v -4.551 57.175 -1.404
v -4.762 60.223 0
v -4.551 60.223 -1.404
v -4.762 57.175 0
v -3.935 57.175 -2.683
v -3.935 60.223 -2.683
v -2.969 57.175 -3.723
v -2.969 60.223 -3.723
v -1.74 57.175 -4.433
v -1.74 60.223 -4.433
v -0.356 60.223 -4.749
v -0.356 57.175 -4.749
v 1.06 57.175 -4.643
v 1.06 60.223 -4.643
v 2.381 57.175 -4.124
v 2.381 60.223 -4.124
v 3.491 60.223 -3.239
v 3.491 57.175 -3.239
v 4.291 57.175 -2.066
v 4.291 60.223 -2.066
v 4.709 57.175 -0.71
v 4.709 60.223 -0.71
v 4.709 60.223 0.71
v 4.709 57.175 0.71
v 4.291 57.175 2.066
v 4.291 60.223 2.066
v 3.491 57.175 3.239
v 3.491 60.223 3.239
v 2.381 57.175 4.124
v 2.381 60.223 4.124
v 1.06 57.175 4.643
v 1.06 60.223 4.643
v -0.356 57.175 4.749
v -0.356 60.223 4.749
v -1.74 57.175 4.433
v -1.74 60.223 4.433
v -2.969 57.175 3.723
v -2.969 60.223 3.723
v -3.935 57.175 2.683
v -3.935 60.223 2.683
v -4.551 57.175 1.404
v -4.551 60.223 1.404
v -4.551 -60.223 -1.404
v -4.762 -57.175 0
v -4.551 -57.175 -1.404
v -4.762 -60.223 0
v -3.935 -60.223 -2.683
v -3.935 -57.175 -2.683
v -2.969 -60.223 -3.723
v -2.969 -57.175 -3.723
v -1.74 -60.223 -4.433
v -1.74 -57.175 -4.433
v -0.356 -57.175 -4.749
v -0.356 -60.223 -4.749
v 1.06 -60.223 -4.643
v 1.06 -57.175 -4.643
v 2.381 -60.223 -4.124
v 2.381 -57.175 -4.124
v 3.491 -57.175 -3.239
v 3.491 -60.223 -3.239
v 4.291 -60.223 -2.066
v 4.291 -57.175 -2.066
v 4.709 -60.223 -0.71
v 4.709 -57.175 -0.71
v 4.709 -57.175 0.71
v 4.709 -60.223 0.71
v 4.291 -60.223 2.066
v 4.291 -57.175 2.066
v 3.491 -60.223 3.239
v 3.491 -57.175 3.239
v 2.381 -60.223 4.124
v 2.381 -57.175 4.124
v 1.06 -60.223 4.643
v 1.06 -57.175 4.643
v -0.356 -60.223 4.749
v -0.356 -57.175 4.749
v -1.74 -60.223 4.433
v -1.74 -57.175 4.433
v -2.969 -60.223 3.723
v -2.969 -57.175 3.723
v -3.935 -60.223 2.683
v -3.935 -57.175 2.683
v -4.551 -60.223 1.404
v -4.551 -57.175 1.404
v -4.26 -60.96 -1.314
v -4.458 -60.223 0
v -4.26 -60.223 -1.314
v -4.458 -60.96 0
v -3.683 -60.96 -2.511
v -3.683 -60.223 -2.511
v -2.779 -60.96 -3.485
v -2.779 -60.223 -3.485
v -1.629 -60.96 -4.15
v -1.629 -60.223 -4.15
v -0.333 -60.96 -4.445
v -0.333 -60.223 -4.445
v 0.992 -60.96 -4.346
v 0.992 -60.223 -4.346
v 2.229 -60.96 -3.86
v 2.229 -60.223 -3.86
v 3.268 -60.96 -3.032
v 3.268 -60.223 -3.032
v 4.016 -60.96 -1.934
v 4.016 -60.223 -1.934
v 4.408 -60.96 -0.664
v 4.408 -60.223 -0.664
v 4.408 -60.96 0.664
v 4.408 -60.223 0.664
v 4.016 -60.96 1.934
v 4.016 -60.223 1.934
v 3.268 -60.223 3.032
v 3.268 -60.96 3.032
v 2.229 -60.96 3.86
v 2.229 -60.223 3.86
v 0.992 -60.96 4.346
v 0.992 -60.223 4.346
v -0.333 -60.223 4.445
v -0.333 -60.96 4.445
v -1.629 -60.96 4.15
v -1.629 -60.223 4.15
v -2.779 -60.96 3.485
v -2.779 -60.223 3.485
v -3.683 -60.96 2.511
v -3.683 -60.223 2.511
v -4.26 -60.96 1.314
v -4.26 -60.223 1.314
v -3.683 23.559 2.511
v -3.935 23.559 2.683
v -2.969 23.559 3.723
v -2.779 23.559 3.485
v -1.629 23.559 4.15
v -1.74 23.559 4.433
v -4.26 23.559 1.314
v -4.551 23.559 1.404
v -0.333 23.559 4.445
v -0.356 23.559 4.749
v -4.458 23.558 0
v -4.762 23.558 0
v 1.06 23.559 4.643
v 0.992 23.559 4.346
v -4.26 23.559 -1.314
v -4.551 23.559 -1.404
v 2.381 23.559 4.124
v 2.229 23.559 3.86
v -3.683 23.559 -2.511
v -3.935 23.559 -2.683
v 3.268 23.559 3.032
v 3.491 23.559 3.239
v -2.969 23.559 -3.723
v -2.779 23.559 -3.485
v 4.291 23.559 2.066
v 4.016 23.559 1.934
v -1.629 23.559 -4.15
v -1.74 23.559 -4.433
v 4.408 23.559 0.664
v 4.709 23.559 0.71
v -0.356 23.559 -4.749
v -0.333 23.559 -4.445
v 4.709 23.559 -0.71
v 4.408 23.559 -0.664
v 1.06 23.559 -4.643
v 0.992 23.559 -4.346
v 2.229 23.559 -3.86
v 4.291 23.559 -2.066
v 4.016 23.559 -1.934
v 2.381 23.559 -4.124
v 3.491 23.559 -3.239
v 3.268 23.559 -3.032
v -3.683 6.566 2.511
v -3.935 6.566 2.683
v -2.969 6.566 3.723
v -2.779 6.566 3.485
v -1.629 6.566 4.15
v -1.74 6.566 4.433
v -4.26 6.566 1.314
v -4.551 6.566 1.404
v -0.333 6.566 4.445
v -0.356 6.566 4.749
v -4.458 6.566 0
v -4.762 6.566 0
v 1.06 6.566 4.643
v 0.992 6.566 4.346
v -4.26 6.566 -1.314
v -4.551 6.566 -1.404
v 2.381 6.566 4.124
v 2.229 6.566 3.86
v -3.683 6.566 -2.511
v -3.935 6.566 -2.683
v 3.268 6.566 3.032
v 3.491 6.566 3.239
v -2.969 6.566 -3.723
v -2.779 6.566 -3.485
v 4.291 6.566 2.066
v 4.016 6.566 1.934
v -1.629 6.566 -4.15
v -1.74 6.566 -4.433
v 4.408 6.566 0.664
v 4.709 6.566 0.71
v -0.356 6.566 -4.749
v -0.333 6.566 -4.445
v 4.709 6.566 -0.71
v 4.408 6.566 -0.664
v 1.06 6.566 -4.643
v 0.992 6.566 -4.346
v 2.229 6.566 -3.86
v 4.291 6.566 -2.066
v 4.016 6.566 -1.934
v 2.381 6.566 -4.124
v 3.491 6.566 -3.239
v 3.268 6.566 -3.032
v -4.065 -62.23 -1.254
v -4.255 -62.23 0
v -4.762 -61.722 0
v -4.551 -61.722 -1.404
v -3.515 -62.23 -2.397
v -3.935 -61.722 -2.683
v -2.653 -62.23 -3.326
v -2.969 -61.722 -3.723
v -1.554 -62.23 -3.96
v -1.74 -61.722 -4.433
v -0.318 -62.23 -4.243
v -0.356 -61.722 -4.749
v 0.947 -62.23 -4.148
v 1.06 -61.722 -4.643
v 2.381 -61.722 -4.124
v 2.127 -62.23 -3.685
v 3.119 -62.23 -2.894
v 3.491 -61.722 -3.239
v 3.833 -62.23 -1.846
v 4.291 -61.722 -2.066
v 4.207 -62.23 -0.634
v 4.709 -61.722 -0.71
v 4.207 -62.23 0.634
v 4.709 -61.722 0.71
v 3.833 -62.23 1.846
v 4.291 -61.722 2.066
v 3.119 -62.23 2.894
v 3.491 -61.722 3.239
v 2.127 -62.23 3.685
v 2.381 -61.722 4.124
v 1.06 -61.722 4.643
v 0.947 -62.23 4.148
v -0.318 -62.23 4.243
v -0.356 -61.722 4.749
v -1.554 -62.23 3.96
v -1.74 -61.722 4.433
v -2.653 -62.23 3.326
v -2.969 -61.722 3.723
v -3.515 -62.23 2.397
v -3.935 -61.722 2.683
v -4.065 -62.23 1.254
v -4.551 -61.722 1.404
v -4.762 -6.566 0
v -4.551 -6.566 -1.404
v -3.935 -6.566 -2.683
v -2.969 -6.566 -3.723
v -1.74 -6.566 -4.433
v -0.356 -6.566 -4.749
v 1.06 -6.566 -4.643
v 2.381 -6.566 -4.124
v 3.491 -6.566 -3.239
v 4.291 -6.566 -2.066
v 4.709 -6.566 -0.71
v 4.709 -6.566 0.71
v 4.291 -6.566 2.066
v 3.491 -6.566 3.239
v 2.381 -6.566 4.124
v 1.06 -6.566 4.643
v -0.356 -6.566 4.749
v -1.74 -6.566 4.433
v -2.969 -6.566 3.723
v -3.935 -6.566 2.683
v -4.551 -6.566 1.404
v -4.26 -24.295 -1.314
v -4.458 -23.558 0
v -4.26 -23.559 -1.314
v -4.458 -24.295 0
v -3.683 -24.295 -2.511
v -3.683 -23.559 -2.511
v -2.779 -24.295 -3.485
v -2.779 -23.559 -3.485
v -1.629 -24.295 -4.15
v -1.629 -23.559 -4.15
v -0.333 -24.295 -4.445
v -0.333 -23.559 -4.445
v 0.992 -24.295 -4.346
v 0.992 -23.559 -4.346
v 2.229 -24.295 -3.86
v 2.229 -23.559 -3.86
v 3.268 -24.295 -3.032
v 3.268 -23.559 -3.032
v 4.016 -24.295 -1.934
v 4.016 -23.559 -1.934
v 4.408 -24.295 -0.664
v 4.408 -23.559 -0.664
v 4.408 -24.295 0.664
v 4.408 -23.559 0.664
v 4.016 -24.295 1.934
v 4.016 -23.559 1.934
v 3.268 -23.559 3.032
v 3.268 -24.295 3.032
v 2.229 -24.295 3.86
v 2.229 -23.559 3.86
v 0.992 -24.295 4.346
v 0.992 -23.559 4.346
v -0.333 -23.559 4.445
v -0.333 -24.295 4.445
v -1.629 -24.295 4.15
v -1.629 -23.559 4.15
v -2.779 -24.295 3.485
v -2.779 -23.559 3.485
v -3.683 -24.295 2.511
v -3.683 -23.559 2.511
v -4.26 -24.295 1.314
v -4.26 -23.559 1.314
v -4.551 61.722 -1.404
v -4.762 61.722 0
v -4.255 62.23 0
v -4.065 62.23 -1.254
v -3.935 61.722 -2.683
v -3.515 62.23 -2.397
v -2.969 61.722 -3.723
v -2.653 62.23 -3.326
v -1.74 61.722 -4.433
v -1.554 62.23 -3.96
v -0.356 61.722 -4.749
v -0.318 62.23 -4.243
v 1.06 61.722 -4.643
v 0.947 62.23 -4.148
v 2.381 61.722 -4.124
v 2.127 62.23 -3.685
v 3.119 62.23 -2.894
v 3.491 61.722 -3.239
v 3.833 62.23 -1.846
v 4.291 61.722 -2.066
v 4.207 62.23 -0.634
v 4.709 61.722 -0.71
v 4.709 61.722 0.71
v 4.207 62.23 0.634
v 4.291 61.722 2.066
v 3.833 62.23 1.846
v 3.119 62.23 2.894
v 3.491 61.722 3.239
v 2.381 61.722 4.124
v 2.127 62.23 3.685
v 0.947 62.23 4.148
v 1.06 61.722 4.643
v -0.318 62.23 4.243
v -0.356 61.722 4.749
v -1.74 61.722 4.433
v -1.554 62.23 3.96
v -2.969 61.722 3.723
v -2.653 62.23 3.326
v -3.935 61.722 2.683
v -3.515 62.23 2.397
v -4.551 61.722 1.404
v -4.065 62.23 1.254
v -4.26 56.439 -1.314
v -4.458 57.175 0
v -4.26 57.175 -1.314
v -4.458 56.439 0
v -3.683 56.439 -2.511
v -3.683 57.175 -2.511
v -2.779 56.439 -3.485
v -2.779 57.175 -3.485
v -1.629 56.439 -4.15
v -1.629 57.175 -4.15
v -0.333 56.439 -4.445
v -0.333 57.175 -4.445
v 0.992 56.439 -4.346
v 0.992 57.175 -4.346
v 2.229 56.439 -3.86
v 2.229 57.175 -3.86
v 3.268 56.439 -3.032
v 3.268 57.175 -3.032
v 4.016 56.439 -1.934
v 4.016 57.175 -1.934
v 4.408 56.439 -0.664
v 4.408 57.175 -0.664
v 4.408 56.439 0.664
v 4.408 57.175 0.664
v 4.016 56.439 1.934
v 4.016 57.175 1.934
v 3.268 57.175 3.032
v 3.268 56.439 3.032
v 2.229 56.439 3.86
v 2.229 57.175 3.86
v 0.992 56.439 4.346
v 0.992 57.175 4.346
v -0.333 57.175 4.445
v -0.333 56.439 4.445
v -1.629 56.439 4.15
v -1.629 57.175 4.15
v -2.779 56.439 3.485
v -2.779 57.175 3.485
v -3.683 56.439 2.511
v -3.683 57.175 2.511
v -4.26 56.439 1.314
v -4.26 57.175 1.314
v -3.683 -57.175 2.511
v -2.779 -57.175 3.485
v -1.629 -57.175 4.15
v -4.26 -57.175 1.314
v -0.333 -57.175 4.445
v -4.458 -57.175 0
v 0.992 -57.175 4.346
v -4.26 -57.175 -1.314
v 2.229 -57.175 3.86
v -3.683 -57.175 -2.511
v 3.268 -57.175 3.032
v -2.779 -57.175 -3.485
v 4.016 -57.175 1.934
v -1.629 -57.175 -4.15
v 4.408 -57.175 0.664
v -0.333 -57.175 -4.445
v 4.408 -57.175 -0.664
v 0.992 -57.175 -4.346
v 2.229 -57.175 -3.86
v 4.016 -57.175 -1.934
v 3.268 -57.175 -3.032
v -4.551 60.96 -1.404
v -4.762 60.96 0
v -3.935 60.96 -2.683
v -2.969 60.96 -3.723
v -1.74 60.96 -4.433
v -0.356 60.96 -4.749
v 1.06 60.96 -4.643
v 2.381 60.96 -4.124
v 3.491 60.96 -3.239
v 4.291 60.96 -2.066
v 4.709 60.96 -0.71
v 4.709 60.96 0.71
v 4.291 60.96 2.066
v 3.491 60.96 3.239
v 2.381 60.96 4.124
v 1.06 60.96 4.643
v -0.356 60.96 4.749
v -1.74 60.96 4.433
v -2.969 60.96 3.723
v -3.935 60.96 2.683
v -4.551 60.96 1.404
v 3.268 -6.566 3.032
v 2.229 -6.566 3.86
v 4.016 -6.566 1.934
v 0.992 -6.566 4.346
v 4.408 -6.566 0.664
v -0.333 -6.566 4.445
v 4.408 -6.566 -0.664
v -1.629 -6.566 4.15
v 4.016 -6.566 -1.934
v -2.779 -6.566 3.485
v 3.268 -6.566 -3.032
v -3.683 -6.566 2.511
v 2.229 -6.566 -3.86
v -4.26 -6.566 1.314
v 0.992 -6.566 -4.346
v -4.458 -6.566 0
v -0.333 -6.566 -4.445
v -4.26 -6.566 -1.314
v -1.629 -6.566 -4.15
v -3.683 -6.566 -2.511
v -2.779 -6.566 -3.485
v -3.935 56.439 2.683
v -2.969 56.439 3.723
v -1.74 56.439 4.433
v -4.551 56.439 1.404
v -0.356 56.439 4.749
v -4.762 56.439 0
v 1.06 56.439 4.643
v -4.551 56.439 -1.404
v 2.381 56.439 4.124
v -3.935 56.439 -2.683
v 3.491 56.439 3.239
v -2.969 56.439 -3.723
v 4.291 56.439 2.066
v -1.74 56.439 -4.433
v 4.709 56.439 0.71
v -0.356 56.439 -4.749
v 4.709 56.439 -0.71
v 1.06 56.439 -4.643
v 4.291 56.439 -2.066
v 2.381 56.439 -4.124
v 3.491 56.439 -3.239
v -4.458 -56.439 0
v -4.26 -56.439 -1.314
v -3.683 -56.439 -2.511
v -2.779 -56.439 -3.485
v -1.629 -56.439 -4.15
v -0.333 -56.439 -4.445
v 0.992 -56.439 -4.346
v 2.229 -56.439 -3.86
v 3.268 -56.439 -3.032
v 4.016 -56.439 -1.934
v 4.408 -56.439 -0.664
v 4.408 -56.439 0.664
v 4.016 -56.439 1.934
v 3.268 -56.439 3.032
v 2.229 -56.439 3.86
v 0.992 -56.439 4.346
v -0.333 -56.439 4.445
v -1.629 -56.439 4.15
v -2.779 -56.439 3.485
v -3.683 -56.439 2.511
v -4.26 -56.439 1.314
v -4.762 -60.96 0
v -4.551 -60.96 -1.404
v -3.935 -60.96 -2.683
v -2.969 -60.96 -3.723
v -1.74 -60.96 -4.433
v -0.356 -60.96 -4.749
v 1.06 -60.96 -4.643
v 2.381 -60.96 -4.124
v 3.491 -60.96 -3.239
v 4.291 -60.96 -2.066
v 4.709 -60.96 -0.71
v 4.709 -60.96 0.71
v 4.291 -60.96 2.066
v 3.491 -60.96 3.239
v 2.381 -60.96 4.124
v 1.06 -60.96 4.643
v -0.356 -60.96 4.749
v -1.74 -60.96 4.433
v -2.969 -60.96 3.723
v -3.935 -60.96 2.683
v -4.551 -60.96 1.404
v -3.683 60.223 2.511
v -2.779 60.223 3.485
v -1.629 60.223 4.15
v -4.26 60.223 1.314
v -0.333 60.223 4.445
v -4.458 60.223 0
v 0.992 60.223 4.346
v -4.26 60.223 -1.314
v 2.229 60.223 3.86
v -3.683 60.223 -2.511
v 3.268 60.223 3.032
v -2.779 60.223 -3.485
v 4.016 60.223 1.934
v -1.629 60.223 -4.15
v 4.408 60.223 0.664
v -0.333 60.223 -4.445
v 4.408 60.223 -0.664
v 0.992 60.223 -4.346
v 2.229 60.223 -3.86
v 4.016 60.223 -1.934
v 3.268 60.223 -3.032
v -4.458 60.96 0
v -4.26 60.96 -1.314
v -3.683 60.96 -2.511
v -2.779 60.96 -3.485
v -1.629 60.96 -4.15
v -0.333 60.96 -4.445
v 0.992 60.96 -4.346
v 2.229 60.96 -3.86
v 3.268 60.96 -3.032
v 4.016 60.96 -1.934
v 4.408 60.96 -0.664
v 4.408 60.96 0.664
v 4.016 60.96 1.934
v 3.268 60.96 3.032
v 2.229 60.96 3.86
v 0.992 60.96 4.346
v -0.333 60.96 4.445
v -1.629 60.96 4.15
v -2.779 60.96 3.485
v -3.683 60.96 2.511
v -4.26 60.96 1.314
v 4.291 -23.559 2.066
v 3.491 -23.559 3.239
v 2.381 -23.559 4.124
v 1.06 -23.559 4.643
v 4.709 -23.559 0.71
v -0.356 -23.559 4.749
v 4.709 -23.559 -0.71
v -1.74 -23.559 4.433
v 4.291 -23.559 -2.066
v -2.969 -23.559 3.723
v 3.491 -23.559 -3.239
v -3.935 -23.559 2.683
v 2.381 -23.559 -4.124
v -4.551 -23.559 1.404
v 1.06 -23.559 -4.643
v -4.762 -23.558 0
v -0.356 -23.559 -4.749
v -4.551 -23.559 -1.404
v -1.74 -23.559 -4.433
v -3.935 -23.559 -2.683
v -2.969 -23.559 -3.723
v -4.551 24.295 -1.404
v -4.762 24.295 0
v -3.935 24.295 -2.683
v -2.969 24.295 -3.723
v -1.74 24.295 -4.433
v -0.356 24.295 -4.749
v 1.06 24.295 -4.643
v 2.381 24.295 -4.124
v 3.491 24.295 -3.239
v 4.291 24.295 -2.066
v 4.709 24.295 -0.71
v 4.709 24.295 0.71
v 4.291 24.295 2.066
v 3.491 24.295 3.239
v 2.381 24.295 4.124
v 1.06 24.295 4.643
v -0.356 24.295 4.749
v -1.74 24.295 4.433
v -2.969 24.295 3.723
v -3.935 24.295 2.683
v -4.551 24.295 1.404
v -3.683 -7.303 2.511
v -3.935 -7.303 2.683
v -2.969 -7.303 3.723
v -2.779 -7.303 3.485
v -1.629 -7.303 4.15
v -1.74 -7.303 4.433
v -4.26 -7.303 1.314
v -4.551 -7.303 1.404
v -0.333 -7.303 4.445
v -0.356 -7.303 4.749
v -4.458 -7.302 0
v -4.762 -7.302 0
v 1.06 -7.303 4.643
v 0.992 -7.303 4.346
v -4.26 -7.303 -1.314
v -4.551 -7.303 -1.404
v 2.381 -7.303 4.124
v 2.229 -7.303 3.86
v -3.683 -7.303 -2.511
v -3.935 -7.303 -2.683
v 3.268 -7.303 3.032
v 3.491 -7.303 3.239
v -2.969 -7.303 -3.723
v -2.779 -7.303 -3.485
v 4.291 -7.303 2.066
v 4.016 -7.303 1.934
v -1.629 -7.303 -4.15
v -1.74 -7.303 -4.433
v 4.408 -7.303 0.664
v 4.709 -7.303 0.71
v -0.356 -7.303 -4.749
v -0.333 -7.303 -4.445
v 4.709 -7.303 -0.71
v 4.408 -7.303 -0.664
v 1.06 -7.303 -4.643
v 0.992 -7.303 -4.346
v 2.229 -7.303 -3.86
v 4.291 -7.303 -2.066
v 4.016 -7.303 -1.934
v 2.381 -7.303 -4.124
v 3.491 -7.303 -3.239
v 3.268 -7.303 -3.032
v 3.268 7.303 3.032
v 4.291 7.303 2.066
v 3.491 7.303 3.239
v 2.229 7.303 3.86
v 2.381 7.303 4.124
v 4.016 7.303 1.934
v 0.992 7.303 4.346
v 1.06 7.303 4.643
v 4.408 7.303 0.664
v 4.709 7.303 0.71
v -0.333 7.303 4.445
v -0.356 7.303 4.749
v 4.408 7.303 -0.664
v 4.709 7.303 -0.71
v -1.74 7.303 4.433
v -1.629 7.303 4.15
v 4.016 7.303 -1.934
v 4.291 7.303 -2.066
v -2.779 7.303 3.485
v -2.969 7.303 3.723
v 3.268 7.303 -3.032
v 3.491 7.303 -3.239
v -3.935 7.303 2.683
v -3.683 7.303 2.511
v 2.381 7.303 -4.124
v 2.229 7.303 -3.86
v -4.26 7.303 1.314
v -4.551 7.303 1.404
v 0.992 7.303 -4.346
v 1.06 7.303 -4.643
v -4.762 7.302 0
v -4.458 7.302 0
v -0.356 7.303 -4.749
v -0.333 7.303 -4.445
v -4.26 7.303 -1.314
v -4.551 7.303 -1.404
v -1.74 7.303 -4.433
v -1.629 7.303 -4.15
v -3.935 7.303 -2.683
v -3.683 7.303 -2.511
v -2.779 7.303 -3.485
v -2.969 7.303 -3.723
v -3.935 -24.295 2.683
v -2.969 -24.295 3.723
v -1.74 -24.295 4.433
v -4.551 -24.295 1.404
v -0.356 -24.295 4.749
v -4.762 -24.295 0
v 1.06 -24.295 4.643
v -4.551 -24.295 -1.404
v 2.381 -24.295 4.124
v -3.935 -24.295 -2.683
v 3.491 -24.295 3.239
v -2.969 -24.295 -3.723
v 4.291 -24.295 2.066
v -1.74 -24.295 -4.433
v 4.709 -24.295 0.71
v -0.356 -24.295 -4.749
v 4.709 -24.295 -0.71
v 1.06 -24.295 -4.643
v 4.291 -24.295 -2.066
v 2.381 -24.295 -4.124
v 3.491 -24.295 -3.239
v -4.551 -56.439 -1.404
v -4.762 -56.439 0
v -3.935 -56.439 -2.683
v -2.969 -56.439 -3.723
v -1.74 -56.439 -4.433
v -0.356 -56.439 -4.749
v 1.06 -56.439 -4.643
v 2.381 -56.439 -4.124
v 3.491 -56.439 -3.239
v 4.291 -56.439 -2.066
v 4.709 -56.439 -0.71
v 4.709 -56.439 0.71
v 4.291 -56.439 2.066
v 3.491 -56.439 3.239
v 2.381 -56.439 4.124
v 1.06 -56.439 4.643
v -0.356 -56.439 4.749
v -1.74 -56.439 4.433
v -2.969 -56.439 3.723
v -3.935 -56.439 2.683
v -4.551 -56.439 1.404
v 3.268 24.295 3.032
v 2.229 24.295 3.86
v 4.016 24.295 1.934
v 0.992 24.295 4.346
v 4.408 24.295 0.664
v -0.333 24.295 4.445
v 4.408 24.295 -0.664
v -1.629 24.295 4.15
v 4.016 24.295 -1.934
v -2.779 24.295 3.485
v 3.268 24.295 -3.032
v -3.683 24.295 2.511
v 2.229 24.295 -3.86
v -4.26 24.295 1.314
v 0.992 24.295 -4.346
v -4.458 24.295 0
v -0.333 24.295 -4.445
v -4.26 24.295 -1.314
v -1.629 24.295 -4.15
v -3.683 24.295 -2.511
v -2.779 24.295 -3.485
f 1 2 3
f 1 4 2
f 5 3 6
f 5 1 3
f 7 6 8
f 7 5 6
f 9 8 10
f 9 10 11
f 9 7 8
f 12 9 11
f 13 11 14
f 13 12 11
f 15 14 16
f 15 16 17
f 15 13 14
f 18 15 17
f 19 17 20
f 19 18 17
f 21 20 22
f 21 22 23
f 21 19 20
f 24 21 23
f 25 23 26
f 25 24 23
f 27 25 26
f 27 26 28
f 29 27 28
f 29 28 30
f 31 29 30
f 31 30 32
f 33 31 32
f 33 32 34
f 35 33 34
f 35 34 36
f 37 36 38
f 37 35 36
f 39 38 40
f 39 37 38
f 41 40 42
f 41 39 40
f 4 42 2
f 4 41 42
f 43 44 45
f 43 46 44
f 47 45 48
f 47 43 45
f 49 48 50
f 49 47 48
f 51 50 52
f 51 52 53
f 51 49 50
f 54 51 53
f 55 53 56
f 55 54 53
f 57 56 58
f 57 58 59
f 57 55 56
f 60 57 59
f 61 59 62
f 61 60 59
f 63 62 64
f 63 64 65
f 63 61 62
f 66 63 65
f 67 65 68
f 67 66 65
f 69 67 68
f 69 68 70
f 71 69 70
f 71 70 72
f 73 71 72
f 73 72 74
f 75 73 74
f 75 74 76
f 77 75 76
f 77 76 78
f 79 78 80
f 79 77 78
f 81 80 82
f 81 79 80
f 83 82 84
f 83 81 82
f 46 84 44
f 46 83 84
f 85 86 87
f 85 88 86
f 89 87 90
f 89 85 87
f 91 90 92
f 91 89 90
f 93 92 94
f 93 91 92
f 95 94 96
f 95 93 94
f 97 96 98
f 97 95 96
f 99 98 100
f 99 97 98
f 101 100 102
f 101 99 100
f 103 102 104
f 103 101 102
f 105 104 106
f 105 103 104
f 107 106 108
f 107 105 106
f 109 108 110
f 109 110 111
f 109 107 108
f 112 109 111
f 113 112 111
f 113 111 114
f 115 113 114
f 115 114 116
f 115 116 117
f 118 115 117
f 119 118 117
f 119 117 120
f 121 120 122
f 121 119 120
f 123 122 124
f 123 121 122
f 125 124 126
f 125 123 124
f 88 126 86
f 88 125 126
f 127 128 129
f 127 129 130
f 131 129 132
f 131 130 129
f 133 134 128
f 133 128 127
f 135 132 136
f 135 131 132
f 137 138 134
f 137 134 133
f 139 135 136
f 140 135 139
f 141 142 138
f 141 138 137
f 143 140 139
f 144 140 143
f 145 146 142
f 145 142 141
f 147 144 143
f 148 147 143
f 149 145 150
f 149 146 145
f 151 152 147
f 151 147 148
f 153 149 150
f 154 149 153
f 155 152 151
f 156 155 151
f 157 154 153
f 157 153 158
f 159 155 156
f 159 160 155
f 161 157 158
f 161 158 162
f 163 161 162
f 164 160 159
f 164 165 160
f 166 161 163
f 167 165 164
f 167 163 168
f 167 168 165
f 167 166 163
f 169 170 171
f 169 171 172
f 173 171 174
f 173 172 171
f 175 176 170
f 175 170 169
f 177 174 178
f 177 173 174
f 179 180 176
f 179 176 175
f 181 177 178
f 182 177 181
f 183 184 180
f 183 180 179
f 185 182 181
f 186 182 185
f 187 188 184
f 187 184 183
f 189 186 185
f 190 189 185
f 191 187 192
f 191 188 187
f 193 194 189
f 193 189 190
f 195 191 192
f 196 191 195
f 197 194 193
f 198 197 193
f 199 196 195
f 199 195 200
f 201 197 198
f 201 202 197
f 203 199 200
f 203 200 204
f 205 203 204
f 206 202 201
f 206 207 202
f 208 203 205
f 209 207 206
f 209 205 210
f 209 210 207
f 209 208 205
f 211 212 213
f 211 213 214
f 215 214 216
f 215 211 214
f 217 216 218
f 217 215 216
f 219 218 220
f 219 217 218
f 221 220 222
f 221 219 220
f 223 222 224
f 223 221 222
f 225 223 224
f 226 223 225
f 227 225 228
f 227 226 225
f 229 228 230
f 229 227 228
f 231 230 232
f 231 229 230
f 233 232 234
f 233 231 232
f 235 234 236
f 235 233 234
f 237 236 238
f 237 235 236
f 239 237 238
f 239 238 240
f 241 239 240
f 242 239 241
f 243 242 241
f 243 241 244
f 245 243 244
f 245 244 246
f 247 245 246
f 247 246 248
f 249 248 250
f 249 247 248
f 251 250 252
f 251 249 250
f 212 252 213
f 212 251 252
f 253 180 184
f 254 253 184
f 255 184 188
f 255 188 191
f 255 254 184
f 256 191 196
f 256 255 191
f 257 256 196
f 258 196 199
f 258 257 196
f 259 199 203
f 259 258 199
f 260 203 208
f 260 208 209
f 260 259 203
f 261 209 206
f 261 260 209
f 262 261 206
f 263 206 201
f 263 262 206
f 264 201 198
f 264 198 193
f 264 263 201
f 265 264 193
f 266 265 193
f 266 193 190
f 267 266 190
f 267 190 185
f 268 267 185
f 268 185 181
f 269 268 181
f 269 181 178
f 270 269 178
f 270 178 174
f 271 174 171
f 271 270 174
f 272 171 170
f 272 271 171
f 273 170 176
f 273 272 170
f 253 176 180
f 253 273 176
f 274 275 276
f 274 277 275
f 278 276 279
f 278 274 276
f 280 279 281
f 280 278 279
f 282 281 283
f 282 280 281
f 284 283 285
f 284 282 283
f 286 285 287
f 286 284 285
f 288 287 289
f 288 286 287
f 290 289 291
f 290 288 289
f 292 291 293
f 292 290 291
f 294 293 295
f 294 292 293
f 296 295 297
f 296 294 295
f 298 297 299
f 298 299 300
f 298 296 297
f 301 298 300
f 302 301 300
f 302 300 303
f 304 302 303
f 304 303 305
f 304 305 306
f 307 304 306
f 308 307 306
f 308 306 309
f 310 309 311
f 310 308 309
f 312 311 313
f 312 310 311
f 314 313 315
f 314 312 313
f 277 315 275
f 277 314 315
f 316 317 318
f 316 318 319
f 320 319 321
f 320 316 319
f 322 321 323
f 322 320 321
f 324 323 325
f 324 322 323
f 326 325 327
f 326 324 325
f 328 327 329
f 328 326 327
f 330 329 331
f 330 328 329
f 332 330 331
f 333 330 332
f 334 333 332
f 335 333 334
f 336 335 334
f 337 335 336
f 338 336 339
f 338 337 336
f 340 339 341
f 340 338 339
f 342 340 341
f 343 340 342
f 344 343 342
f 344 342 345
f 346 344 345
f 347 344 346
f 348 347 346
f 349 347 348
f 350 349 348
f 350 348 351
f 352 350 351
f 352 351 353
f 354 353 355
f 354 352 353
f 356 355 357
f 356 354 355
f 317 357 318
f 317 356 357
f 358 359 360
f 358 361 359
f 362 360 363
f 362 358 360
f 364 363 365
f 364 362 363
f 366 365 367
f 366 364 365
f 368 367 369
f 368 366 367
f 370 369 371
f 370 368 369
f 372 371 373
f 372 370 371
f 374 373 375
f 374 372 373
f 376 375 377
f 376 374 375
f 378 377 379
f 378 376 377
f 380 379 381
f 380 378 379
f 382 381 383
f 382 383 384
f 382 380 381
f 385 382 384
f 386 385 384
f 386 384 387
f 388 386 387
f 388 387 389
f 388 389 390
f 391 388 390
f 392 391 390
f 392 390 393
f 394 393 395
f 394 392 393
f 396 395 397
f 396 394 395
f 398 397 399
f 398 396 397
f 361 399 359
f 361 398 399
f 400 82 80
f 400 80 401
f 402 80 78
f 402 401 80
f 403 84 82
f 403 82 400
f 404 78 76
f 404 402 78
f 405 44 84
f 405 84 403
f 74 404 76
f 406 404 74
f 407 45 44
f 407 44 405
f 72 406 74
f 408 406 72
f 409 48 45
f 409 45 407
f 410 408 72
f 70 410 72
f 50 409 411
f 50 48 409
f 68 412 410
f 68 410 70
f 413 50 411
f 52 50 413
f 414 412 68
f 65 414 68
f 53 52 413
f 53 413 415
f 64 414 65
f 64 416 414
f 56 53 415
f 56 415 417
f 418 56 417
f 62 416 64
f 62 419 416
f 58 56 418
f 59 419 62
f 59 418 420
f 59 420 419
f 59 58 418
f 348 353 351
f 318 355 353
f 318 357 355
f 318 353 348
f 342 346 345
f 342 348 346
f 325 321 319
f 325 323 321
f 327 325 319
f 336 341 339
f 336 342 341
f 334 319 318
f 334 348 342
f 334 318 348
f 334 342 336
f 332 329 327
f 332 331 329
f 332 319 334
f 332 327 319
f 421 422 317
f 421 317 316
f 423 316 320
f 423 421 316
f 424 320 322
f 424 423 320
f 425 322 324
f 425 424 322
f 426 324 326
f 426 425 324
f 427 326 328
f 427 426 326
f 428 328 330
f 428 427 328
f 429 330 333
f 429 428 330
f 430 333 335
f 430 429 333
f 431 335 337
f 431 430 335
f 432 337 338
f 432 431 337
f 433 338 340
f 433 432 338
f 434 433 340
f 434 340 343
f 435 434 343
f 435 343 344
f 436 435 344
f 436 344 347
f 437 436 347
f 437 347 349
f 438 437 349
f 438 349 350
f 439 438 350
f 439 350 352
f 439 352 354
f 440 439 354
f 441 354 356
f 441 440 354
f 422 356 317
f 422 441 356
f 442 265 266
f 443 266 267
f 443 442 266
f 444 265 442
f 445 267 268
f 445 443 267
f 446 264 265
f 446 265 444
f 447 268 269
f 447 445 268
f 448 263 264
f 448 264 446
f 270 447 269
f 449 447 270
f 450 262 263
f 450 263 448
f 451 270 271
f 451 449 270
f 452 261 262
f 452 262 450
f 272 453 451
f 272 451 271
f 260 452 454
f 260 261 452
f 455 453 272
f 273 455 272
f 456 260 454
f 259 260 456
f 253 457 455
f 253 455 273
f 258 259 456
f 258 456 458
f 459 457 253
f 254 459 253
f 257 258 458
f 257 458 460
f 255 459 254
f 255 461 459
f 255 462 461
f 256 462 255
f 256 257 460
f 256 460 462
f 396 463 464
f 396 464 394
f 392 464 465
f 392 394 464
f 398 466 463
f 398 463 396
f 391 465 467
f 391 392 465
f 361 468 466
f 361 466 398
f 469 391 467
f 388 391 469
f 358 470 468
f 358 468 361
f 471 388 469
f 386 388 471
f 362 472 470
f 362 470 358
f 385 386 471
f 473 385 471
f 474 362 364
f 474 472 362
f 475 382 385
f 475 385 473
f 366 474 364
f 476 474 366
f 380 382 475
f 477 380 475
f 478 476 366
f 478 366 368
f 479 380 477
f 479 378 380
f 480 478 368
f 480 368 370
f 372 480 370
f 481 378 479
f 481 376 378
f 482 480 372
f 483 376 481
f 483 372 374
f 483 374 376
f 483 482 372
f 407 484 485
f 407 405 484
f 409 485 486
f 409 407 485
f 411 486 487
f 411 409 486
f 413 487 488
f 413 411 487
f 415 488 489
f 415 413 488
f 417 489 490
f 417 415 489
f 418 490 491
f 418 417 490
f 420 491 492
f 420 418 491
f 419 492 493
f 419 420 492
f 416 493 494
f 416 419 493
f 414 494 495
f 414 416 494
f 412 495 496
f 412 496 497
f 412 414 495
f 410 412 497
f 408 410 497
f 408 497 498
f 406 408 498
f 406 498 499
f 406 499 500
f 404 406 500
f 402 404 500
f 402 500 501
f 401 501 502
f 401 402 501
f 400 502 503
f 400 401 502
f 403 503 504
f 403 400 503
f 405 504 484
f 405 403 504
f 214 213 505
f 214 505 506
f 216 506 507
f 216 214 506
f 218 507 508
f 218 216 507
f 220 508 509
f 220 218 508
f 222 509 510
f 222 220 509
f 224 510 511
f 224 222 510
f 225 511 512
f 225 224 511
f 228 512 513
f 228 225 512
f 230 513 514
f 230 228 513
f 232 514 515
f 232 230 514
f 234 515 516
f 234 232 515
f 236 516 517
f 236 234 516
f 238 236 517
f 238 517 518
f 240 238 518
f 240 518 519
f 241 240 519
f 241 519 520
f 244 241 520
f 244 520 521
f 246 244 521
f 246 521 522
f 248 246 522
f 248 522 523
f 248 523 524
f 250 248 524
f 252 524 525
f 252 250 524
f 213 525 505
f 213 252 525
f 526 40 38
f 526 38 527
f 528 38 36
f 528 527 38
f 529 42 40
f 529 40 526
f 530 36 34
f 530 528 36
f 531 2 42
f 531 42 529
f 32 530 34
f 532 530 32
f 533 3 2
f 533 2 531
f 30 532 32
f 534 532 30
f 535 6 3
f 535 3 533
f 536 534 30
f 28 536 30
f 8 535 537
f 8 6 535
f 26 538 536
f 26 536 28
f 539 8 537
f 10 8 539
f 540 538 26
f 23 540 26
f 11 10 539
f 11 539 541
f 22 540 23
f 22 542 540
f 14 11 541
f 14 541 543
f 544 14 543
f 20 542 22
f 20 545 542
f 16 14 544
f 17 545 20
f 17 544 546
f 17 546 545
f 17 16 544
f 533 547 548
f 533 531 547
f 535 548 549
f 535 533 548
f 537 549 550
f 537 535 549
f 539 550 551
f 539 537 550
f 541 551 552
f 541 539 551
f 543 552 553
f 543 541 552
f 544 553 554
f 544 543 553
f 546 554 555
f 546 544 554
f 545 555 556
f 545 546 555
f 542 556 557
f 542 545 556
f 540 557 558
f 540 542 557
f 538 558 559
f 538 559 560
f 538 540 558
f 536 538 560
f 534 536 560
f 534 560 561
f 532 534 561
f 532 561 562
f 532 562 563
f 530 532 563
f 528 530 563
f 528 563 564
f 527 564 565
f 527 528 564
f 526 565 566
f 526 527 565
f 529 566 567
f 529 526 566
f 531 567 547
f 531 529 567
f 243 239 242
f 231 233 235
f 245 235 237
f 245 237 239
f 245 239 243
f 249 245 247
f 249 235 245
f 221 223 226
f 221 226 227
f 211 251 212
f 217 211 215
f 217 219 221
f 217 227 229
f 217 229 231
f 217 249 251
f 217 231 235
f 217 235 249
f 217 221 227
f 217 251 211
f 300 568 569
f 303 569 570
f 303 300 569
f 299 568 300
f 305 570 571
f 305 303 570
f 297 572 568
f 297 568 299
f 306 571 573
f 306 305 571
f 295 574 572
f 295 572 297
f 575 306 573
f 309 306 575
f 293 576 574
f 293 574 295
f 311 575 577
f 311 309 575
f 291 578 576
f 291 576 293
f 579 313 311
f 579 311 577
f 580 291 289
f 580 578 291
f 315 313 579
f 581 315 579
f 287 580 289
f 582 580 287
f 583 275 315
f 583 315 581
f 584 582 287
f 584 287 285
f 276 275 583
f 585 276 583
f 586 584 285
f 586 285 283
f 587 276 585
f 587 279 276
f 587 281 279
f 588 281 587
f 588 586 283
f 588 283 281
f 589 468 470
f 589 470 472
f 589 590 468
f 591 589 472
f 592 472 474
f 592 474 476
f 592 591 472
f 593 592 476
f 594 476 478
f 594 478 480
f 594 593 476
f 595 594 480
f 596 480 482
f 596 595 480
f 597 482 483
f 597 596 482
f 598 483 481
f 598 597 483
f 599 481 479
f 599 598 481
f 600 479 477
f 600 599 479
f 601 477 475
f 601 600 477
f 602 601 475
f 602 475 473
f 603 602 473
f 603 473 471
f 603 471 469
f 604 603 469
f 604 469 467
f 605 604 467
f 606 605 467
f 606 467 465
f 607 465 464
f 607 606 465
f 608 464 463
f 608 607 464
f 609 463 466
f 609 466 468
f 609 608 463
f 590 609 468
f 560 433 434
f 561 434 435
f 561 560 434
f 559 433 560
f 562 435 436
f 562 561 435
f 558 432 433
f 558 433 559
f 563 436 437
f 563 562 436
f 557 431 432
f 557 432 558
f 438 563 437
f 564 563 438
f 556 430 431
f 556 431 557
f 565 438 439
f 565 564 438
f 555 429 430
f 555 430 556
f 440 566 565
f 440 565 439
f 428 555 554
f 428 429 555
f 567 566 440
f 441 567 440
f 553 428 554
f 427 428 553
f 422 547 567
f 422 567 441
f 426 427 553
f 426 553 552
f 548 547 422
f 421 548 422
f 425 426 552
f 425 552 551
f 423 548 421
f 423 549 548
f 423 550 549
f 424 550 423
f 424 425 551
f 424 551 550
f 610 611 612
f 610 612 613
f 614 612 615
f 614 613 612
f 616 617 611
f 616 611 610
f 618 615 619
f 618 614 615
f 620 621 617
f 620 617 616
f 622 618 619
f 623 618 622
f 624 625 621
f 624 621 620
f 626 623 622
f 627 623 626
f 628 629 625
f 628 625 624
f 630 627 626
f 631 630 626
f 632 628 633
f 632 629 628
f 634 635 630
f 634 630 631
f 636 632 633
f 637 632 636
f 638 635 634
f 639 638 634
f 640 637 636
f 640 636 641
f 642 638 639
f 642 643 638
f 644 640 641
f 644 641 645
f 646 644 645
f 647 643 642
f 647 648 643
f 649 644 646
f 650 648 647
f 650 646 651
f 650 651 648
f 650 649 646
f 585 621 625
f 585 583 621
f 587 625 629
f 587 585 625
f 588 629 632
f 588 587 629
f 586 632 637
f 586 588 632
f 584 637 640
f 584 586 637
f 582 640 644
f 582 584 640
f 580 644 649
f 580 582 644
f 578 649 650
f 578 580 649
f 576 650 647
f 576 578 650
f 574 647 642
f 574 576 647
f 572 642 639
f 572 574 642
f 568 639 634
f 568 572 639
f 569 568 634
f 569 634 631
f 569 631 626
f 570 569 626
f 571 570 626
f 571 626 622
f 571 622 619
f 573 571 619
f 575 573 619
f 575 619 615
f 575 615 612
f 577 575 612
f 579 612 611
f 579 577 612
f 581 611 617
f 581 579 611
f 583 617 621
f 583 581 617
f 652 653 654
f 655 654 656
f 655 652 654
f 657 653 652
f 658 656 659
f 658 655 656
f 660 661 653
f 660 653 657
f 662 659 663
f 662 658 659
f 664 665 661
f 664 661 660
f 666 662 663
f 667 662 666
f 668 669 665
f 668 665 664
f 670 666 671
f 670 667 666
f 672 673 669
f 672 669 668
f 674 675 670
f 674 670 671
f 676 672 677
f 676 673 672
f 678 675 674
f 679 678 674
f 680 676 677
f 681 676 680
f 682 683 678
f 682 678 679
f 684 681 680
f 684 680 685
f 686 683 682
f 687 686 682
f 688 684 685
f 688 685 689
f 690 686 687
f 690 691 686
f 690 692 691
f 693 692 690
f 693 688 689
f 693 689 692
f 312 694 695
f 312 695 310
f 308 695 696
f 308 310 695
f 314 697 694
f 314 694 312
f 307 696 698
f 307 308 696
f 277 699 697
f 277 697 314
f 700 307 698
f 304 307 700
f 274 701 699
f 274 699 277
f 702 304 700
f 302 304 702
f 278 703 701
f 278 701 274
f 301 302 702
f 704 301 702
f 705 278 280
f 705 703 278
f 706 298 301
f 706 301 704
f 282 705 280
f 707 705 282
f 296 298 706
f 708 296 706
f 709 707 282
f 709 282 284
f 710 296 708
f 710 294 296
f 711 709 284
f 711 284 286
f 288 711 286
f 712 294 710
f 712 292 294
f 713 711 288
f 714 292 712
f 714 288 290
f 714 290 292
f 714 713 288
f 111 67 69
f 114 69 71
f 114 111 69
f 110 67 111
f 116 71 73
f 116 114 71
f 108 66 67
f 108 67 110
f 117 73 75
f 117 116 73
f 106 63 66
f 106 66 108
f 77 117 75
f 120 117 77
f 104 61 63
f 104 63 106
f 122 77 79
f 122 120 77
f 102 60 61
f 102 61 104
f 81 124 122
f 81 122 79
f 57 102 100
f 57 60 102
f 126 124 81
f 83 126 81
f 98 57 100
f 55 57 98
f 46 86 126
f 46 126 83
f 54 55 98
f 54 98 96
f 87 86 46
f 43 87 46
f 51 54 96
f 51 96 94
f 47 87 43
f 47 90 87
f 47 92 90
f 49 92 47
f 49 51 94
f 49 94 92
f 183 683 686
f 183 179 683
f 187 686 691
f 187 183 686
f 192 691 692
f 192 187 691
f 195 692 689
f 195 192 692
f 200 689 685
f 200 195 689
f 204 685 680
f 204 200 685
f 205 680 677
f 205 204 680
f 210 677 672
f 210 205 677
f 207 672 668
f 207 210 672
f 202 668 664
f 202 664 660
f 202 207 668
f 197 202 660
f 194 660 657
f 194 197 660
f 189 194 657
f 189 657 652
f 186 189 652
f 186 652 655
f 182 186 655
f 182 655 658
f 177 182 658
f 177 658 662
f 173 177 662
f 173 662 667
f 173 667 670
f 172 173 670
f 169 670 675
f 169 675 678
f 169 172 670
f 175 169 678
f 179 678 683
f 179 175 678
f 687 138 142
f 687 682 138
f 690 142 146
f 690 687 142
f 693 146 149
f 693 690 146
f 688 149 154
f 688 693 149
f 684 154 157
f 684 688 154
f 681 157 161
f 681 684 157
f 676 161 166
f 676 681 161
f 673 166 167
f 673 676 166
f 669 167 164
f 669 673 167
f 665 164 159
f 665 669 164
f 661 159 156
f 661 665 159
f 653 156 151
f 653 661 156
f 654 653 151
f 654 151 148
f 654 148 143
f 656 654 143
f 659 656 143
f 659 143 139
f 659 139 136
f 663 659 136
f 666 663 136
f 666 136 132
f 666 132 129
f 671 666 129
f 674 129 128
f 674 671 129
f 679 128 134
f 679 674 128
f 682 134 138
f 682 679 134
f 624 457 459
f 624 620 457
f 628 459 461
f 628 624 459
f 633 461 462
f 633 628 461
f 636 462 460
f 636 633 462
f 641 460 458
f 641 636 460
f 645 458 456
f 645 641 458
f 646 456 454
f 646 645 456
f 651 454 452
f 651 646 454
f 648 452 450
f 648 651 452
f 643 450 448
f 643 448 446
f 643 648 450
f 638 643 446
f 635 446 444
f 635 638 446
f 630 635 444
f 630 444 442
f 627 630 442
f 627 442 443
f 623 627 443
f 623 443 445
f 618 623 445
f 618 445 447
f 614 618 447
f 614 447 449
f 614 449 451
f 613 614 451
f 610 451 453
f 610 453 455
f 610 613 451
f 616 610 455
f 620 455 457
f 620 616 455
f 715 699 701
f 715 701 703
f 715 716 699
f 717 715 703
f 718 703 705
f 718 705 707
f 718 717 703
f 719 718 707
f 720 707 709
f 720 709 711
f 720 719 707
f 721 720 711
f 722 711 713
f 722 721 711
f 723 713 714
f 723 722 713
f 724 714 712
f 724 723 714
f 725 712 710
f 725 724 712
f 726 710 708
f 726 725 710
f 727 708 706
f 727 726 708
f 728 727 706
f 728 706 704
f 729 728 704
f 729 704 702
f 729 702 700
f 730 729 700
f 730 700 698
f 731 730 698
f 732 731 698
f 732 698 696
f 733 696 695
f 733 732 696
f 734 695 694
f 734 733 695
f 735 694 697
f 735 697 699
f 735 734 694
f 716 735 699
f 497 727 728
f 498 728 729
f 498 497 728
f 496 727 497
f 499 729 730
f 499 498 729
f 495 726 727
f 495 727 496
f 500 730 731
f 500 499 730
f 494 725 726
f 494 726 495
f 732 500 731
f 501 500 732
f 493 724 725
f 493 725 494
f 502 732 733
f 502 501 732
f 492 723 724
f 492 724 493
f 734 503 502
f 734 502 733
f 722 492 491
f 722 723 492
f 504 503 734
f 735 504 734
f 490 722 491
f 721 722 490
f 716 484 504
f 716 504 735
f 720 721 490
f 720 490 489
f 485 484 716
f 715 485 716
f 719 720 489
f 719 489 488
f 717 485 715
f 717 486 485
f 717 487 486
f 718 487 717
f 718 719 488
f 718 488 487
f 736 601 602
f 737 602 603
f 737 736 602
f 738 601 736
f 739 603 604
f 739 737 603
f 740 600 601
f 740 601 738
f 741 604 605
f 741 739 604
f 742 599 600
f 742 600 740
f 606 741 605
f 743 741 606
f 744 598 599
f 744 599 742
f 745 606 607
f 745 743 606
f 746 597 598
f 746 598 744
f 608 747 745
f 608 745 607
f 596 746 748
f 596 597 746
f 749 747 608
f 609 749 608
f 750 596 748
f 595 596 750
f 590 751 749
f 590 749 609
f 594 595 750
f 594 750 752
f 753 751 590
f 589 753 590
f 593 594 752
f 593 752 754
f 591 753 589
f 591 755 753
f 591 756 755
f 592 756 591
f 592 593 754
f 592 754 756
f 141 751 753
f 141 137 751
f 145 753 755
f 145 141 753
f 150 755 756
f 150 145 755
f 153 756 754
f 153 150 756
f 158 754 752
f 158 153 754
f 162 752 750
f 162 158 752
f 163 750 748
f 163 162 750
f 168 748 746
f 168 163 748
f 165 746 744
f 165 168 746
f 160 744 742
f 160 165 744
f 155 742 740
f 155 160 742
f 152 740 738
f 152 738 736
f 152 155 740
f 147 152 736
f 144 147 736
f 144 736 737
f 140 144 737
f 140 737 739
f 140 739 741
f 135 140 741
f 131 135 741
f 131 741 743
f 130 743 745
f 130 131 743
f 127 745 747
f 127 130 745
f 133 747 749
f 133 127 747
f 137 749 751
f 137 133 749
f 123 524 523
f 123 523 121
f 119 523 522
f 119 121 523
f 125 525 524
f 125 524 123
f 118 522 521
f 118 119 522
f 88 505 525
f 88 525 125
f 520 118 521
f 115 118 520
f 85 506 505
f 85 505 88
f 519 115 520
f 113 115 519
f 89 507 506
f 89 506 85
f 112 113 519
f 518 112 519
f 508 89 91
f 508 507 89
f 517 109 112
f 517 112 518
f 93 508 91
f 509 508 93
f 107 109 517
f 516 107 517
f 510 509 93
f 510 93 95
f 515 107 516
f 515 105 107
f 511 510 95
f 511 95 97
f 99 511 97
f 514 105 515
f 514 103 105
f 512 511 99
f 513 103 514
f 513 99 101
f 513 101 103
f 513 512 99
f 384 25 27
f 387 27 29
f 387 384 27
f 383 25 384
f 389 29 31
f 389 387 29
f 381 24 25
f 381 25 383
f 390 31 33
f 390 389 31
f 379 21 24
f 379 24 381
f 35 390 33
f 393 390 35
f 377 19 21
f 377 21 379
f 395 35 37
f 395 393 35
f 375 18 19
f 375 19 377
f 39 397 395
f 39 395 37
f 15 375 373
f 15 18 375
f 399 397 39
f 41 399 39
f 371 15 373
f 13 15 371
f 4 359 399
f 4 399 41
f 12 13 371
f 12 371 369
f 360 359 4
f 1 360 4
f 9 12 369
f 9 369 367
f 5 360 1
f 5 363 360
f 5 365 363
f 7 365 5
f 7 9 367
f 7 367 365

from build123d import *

# Parameters (mm, degrees)
CHAMFER1_SIZE = 0.508


with BuildPart() as part:
    # Sketch1 → Revolve1 (revolve)
    with BuildSketch(Plane.XY):
        Polygon((-4.7625, 60.2234), (-4.7625, 57.1754), (-4.4577, 57.1754), (-4.4577, 56.4388), (-4.7625, 56.4388), (-4.7625, 24.2951), (-4.4577, 24.2951), (-4.4577, 23.5585), (-4.7625, 23.5585), (-4.7625, 7.3025), (-4.4577, 7.3025), (-4.4577, 6.5659), (-4.7625, 6.5659), (-4.7625, -6.5659), (-4.4577, -6.5659), (-4.4577, -7.3025), (-4.7625, -7.3025), (-4.7625, -23.5585), (-4.4577, -23.5585), (-4.4577, -24.2951), (-4.7625, -24.2951), (-4.7625, -56.4388), (-4.4577, -56.4388), (-4.4577, -57.1754), (-4.7625, -57.1754), (-4.7625, -60.2234), (-4.4577, -60.2234), (-4.4577, -60.96), (-4.7625, -60.96), (-4.7625, -62.23), (0, -62.23), (0, 62.23), (-4.7625, 62.23), (-4.7625, 60.96), (-4.4577, 60.96), (-4.4577, 60.2234), align=None)
    revolve(axis=Axis((0, 62.23, 0), (0, -1, 0)))

    # Chamfer1
    chamfer1_edges = [part.edges().sort_by_distance(p)[0] for p in [
        (4.7625, 62.23, 0),
        (4.7625, -62.23, 0),
    ]]
    chamfer(chamfer1_edges, length=CHAMFER1_SIZE)


solid = part.part
